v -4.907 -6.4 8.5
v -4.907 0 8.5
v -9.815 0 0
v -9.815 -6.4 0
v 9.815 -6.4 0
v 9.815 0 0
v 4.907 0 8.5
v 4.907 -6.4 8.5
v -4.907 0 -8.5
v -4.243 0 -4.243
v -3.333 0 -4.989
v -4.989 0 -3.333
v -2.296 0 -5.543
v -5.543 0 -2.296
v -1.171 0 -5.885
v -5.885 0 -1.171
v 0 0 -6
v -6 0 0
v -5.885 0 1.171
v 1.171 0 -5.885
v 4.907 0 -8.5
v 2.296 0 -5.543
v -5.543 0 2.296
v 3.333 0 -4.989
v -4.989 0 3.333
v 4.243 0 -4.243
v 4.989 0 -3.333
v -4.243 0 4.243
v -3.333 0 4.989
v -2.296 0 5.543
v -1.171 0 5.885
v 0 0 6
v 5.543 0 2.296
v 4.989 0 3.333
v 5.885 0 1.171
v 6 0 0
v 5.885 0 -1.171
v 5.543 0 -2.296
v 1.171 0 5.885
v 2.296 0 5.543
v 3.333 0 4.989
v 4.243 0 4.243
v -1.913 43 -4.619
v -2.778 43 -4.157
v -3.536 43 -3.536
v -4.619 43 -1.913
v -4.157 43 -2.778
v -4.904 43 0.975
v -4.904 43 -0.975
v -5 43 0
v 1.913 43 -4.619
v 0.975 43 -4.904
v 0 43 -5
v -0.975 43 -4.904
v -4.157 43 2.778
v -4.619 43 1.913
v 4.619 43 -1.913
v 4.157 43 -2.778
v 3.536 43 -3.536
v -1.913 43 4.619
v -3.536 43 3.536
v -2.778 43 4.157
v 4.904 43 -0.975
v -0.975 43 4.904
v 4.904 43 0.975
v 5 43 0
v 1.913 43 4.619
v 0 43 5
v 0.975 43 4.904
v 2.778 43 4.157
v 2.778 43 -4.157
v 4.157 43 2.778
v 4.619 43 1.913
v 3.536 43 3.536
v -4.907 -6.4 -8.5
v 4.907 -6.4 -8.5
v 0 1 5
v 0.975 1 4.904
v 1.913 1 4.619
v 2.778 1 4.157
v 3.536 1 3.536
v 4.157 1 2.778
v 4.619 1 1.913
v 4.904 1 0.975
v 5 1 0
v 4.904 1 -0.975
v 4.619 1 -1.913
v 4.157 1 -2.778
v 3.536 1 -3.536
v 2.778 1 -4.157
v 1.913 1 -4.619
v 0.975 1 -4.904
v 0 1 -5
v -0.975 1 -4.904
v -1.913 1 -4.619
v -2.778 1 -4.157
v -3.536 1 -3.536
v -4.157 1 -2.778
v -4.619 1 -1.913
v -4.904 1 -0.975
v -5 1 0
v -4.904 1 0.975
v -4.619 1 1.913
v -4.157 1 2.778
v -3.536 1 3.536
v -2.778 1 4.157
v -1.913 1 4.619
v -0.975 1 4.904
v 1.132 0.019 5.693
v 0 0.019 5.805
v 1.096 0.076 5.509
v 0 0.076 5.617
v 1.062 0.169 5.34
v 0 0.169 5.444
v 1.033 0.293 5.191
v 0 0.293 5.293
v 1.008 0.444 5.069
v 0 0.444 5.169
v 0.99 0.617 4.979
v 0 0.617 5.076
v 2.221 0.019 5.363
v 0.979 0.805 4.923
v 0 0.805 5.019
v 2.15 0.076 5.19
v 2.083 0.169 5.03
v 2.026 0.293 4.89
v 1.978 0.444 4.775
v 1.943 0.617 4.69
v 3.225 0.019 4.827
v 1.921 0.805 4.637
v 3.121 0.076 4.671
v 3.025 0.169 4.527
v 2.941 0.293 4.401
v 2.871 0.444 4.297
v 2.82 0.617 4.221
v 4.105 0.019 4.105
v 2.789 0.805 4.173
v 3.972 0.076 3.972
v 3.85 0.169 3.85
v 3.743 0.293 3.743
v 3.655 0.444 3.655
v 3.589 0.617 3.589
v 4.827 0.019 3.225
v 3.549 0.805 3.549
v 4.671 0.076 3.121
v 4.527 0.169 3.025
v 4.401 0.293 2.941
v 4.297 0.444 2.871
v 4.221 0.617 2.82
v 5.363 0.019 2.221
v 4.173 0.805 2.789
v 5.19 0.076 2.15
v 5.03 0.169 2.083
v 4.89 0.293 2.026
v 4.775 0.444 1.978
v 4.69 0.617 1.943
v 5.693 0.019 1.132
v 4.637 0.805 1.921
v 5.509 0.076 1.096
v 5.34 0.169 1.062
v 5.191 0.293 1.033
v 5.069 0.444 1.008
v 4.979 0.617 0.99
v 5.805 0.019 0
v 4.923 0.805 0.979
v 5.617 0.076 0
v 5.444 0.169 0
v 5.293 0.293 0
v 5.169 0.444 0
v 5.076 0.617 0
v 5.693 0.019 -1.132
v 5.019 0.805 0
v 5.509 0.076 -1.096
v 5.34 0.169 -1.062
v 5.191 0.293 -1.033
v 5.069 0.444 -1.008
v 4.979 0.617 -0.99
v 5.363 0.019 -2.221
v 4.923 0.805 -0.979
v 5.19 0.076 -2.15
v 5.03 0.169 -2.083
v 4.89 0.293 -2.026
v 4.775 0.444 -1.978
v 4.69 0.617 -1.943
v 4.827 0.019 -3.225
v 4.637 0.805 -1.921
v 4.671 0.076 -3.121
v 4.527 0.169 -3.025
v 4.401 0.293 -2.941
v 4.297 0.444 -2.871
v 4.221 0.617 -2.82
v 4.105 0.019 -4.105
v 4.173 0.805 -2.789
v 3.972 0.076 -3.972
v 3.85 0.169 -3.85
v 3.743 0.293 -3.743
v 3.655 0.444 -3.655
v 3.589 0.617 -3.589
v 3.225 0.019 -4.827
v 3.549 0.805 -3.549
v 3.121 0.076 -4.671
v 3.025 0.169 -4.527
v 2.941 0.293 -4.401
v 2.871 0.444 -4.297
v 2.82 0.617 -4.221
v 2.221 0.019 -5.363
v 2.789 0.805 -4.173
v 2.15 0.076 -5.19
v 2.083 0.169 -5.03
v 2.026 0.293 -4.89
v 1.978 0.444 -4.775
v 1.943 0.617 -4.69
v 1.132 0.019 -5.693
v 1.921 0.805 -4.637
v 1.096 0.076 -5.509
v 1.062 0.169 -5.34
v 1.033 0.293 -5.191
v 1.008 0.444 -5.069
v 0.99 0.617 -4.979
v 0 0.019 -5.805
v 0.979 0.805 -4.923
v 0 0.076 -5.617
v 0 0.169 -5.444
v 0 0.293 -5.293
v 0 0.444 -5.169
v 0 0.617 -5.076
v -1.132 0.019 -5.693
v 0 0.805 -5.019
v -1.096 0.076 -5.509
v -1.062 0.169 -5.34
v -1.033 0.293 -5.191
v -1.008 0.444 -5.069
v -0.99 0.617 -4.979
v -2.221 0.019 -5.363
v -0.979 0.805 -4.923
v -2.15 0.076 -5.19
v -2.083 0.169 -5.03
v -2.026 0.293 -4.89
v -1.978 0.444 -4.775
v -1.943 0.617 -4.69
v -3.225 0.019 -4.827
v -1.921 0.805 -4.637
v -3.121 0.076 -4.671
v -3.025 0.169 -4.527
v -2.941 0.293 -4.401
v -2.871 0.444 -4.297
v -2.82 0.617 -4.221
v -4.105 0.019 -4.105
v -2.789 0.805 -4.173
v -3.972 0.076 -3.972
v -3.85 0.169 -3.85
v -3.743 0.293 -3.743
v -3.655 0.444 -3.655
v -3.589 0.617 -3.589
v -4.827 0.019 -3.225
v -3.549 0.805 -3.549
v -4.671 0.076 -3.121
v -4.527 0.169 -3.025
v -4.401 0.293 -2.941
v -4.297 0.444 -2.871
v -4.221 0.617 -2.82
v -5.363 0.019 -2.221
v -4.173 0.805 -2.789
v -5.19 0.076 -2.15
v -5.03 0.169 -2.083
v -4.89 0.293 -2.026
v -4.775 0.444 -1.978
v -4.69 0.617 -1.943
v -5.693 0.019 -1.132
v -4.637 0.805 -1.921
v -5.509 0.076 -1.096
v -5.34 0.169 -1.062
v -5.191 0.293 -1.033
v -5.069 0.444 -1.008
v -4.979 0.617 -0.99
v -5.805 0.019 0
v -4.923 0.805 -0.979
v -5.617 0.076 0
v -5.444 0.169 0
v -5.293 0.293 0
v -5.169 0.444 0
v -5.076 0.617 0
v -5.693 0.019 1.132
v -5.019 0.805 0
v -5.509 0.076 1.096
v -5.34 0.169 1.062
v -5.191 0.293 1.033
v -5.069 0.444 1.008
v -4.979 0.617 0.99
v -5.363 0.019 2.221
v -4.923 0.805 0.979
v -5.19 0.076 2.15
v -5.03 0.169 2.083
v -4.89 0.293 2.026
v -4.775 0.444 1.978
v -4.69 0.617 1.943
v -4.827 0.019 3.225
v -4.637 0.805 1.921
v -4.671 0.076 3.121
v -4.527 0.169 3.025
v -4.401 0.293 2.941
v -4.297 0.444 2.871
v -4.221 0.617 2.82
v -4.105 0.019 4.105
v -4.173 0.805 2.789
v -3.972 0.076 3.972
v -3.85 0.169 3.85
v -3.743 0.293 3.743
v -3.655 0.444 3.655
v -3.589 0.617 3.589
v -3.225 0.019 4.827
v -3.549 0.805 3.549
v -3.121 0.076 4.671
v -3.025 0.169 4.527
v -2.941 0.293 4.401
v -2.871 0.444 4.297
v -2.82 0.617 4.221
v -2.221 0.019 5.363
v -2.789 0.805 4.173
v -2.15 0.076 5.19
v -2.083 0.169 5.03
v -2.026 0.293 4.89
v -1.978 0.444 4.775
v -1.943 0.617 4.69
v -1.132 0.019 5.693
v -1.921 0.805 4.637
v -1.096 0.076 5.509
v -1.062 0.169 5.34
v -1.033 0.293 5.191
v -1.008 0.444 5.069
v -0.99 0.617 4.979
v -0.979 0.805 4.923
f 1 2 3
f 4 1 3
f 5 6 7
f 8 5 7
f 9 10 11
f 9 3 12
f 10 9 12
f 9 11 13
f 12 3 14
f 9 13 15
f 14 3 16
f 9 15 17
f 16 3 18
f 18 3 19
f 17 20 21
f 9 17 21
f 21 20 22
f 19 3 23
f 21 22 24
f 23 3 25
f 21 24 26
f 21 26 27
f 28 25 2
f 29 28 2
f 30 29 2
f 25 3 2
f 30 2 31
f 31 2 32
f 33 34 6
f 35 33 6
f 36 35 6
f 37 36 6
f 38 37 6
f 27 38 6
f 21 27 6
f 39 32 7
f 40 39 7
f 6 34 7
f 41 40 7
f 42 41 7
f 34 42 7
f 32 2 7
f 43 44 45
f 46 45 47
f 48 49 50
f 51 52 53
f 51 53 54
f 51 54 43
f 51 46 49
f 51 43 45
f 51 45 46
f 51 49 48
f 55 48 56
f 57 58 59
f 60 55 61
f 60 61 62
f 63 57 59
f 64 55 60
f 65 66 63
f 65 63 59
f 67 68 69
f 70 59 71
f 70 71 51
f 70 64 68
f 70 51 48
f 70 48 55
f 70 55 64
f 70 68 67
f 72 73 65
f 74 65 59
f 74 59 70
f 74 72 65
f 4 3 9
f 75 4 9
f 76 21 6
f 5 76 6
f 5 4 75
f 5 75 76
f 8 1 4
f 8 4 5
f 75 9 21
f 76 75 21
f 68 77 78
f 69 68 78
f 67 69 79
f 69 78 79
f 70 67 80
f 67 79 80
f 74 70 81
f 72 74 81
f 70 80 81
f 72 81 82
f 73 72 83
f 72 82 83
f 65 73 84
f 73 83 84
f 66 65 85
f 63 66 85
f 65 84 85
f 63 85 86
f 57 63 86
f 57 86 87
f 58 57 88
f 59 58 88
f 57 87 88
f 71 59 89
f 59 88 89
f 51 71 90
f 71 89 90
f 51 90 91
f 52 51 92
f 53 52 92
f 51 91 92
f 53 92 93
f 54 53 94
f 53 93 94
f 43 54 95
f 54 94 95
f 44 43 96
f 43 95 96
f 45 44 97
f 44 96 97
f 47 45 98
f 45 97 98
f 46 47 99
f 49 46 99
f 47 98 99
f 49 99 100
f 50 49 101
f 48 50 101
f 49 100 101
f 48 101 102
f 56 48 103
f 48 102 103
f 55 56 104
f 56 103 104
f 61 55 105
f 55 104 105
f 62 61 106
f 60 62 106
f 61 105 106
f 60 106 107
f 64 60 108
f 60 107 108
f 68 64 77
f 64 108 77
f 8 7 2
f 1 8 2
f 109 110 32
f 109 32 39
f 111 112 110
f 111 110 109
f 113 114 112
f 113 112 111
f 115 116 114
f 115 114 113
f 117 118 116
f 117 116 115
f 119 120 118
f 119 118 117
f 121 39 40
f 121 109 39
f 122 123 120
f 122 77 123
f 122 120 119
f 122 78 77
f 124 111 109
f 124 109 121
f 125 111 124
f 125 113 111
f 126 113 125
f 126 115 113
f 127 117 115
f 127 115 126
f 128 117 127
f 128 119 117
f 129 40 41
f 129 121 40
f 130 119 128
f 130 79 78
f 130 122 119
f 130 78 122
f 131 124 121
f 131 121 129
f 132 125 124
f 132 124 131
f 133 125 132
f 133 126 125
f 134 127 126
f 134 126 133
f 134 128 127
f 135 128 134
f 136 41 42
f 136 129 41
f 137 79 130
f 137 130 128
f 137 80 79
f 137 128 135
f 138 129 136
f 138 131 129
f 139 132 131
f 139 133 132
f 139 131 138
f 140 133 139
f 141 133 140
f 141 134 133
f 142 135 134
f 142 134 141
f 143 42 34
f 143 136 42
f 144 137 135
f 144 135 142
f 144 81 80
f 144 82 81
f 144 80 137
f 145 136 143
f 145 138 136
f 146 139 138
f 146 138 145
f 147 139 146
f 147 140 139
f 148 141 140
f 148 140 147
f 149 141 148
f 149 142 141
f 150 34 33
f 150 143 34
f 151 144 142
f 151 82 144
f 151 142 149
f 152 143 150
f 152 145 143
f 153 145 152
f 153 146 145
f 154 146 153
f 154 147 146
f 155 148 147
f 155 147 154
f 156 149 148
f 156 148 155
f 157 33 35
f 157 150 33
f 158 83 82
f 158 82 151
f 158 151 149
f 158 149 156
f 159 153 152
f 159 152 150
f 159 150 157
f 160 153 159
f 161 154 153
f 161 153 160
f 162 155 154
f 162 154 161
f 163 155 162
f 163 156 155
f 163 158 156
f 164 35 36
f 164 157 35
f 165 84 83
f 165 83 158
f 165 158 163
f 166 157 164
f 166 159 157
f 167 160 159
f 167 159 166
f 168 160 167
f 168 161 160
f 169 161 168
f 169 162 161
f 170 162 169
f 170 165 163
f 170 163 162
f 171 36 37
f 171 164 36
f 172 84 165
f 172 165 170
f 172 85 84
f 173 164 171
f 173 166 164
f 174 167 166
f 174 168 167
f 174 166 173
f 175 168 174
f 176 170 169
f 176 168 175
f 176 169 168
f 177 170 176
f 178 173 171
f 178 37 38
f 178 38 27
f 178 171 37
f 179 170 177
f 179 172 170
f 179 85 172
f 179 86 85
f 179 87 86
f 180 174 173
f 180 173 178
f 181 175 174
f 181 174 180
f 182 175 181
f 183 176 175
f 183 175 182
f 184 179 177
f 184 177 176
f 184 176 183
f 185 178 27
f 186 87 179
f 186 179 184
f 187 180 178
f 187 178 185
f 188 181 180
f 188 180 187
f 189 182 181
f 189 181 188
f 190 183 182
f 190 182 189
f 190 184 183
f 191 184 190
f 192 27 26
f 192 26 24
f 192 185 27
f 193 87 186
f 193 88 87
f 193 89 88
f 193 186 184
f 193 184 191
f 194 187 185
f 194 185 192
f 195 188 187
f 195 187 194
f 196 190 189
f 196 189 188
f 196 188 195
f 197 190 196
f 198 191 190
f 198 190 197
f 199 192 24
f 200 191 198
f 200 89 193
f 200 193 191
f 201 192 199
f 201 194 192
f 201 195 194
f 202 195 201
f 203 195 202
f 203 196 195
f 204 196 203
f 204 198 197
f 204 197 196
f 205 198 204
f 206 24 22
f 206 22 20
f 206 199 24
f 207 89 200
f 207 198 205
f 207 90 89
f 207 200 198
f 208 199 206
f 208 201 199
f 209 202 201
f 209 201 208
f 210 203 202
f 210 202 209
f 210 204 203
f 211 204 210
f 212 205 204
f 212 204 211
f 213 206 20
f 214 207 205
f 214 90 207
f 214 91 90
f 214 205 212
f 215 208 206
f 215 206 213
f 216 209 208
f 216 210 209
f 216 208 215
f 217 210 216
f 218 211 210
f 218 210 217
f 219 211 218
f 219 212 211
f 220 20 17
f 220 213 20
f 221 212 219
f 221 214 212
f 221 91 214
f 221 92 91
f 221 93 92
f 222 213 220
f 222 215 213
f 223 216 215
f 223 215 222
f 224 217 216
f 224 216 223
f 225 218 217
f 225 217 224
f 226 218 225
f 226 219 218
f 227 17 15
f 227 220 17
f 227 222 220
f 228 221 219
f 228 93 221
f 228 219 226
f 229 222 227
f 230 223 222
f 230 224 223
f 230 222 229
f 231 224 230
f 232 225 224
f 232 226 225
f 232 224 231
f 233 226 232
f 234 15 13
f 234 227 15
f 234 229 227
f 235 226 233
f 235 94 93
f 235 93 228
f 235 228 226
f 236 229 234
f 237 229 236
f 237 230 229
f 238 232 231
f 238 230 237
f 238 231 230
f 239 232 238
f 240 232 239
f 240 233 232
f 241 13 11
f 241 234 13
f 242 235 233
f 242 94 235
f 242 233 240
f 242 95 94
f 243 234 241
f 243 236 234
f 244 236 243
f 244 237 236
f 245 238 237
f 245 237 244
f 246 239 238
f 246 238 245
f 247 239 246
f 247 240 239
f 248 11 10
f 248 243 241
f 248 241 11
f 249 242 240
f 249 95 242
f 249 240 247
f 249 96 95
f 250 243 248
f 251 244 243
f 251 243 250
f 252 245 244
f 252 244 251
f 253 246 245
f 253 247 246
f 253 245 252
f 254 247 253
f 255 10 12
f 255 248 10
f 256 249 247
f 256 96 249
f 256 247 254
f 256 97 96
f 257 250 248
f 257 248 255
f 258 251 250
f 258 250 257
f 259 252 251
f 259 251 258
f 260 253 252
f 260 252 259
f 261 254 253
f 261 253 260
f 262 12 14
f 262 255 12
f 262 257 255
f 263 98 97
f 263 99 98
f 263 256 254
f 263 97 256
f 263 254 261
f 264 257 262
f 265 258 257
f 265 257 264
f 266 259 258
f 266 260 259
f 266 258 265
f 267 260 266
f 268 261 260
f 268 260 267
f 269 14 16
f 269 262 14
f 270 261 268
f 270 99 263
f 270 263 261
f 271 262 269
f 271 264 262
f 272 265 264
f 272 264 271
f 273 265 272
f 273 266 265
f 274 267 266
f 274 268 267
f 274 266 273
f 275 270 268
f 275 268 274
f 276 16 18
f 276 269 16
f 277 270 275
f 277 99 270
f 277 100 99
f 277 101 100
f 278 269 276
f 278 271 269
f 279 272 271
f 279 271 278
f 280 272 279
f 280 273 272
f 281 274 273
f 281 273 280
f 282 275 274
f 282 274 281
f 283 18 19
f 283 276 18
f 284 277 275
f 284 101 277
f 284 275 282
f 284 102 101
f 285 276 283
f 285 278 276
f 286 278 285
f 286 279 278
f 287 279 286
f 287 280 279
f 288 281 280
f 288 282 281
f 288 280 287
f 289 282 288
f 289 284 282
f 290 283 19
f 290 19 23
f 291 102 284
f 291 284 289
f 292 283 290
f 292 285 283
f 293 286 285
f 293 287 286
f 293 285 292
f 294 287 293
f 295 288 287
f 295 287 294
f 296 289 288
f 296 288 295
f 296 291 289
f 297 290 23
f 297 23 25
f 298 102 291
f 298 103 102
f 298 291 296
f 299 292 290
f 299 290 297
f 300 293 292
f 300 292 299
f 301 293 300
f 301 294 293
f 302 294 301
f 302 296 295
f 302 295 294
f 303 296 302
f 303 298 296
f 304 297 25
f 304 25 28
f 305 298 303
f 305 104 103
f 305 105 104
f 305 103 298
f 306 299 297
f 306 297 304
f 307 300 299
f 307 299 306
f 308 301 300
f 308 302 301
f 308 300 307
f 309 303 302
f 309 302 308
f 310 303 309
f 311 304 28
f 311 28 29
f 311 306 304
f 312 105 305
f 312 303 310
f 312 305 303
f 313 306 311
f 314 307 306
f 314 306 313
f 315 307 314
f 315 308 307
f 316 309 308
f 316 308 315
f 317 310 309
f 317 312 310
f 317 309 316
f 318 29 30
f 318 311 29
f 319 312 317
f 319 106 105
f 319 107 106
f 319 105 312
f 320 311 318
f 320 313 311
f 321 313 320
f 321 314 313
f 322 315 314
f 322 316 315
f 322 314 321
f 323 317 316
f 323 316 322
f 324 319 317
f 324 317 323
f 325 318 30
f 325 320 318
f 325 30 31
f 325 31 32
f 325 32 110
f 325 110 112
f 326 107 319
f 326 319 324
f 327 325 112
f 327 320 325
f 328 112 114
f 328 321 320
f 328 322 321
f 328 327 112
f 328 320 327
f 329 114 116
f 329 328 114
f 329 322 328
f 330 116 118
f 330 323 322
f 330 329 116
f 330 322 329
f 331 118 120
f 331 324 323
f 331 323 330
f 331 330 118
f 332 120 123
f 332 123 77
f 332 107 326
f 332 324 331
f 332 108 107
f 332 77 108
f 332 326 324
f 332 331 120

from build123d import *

# Parameters (mm, degrees)
SKETCH1_R           = 5
BOSS_EXTRUDE1_DEPTH = 43
BOSS_EXTRUDE2_DEPTH = 6.4
FILLET1_R           = 1


with BuildPart() as part:
    # Sketch1 → Boss-Extrude1 (new body)
    with BuildSketch(Plane(origin=(0, 0, 0), x_dir=(1, 0, 0), z_dir=(0, 1, 0))):
        with Locations(Location((0, 0, 0), (0, 0, 270))):
            Circle(SKETCH1_R)
    extrude(amount=BOSS_EXTRUDE1_DEPTH)

    # Sketch2 → Boss-Extrude2 (add)
    with BuildSketch(Plane.XZ):
        Polygon((4.907477288, 8.5), (-4.907477288, 8.5), (-9.814954576, 0), (-4.907477288, -8.5), (4.907477288, -8.5), (9.814954576, 0), align=None)
    extrude(amount=BOSS_EXTRUDE2_DEPTH)

    # Fillet1
    fillet1_edges = [part.edges().sort_by_distance(p)[0] for p in [
        (0, 0, -5),
    ]]
    fillet(fillet1_edges, radius=FILLET1_R)


solid = part.part
